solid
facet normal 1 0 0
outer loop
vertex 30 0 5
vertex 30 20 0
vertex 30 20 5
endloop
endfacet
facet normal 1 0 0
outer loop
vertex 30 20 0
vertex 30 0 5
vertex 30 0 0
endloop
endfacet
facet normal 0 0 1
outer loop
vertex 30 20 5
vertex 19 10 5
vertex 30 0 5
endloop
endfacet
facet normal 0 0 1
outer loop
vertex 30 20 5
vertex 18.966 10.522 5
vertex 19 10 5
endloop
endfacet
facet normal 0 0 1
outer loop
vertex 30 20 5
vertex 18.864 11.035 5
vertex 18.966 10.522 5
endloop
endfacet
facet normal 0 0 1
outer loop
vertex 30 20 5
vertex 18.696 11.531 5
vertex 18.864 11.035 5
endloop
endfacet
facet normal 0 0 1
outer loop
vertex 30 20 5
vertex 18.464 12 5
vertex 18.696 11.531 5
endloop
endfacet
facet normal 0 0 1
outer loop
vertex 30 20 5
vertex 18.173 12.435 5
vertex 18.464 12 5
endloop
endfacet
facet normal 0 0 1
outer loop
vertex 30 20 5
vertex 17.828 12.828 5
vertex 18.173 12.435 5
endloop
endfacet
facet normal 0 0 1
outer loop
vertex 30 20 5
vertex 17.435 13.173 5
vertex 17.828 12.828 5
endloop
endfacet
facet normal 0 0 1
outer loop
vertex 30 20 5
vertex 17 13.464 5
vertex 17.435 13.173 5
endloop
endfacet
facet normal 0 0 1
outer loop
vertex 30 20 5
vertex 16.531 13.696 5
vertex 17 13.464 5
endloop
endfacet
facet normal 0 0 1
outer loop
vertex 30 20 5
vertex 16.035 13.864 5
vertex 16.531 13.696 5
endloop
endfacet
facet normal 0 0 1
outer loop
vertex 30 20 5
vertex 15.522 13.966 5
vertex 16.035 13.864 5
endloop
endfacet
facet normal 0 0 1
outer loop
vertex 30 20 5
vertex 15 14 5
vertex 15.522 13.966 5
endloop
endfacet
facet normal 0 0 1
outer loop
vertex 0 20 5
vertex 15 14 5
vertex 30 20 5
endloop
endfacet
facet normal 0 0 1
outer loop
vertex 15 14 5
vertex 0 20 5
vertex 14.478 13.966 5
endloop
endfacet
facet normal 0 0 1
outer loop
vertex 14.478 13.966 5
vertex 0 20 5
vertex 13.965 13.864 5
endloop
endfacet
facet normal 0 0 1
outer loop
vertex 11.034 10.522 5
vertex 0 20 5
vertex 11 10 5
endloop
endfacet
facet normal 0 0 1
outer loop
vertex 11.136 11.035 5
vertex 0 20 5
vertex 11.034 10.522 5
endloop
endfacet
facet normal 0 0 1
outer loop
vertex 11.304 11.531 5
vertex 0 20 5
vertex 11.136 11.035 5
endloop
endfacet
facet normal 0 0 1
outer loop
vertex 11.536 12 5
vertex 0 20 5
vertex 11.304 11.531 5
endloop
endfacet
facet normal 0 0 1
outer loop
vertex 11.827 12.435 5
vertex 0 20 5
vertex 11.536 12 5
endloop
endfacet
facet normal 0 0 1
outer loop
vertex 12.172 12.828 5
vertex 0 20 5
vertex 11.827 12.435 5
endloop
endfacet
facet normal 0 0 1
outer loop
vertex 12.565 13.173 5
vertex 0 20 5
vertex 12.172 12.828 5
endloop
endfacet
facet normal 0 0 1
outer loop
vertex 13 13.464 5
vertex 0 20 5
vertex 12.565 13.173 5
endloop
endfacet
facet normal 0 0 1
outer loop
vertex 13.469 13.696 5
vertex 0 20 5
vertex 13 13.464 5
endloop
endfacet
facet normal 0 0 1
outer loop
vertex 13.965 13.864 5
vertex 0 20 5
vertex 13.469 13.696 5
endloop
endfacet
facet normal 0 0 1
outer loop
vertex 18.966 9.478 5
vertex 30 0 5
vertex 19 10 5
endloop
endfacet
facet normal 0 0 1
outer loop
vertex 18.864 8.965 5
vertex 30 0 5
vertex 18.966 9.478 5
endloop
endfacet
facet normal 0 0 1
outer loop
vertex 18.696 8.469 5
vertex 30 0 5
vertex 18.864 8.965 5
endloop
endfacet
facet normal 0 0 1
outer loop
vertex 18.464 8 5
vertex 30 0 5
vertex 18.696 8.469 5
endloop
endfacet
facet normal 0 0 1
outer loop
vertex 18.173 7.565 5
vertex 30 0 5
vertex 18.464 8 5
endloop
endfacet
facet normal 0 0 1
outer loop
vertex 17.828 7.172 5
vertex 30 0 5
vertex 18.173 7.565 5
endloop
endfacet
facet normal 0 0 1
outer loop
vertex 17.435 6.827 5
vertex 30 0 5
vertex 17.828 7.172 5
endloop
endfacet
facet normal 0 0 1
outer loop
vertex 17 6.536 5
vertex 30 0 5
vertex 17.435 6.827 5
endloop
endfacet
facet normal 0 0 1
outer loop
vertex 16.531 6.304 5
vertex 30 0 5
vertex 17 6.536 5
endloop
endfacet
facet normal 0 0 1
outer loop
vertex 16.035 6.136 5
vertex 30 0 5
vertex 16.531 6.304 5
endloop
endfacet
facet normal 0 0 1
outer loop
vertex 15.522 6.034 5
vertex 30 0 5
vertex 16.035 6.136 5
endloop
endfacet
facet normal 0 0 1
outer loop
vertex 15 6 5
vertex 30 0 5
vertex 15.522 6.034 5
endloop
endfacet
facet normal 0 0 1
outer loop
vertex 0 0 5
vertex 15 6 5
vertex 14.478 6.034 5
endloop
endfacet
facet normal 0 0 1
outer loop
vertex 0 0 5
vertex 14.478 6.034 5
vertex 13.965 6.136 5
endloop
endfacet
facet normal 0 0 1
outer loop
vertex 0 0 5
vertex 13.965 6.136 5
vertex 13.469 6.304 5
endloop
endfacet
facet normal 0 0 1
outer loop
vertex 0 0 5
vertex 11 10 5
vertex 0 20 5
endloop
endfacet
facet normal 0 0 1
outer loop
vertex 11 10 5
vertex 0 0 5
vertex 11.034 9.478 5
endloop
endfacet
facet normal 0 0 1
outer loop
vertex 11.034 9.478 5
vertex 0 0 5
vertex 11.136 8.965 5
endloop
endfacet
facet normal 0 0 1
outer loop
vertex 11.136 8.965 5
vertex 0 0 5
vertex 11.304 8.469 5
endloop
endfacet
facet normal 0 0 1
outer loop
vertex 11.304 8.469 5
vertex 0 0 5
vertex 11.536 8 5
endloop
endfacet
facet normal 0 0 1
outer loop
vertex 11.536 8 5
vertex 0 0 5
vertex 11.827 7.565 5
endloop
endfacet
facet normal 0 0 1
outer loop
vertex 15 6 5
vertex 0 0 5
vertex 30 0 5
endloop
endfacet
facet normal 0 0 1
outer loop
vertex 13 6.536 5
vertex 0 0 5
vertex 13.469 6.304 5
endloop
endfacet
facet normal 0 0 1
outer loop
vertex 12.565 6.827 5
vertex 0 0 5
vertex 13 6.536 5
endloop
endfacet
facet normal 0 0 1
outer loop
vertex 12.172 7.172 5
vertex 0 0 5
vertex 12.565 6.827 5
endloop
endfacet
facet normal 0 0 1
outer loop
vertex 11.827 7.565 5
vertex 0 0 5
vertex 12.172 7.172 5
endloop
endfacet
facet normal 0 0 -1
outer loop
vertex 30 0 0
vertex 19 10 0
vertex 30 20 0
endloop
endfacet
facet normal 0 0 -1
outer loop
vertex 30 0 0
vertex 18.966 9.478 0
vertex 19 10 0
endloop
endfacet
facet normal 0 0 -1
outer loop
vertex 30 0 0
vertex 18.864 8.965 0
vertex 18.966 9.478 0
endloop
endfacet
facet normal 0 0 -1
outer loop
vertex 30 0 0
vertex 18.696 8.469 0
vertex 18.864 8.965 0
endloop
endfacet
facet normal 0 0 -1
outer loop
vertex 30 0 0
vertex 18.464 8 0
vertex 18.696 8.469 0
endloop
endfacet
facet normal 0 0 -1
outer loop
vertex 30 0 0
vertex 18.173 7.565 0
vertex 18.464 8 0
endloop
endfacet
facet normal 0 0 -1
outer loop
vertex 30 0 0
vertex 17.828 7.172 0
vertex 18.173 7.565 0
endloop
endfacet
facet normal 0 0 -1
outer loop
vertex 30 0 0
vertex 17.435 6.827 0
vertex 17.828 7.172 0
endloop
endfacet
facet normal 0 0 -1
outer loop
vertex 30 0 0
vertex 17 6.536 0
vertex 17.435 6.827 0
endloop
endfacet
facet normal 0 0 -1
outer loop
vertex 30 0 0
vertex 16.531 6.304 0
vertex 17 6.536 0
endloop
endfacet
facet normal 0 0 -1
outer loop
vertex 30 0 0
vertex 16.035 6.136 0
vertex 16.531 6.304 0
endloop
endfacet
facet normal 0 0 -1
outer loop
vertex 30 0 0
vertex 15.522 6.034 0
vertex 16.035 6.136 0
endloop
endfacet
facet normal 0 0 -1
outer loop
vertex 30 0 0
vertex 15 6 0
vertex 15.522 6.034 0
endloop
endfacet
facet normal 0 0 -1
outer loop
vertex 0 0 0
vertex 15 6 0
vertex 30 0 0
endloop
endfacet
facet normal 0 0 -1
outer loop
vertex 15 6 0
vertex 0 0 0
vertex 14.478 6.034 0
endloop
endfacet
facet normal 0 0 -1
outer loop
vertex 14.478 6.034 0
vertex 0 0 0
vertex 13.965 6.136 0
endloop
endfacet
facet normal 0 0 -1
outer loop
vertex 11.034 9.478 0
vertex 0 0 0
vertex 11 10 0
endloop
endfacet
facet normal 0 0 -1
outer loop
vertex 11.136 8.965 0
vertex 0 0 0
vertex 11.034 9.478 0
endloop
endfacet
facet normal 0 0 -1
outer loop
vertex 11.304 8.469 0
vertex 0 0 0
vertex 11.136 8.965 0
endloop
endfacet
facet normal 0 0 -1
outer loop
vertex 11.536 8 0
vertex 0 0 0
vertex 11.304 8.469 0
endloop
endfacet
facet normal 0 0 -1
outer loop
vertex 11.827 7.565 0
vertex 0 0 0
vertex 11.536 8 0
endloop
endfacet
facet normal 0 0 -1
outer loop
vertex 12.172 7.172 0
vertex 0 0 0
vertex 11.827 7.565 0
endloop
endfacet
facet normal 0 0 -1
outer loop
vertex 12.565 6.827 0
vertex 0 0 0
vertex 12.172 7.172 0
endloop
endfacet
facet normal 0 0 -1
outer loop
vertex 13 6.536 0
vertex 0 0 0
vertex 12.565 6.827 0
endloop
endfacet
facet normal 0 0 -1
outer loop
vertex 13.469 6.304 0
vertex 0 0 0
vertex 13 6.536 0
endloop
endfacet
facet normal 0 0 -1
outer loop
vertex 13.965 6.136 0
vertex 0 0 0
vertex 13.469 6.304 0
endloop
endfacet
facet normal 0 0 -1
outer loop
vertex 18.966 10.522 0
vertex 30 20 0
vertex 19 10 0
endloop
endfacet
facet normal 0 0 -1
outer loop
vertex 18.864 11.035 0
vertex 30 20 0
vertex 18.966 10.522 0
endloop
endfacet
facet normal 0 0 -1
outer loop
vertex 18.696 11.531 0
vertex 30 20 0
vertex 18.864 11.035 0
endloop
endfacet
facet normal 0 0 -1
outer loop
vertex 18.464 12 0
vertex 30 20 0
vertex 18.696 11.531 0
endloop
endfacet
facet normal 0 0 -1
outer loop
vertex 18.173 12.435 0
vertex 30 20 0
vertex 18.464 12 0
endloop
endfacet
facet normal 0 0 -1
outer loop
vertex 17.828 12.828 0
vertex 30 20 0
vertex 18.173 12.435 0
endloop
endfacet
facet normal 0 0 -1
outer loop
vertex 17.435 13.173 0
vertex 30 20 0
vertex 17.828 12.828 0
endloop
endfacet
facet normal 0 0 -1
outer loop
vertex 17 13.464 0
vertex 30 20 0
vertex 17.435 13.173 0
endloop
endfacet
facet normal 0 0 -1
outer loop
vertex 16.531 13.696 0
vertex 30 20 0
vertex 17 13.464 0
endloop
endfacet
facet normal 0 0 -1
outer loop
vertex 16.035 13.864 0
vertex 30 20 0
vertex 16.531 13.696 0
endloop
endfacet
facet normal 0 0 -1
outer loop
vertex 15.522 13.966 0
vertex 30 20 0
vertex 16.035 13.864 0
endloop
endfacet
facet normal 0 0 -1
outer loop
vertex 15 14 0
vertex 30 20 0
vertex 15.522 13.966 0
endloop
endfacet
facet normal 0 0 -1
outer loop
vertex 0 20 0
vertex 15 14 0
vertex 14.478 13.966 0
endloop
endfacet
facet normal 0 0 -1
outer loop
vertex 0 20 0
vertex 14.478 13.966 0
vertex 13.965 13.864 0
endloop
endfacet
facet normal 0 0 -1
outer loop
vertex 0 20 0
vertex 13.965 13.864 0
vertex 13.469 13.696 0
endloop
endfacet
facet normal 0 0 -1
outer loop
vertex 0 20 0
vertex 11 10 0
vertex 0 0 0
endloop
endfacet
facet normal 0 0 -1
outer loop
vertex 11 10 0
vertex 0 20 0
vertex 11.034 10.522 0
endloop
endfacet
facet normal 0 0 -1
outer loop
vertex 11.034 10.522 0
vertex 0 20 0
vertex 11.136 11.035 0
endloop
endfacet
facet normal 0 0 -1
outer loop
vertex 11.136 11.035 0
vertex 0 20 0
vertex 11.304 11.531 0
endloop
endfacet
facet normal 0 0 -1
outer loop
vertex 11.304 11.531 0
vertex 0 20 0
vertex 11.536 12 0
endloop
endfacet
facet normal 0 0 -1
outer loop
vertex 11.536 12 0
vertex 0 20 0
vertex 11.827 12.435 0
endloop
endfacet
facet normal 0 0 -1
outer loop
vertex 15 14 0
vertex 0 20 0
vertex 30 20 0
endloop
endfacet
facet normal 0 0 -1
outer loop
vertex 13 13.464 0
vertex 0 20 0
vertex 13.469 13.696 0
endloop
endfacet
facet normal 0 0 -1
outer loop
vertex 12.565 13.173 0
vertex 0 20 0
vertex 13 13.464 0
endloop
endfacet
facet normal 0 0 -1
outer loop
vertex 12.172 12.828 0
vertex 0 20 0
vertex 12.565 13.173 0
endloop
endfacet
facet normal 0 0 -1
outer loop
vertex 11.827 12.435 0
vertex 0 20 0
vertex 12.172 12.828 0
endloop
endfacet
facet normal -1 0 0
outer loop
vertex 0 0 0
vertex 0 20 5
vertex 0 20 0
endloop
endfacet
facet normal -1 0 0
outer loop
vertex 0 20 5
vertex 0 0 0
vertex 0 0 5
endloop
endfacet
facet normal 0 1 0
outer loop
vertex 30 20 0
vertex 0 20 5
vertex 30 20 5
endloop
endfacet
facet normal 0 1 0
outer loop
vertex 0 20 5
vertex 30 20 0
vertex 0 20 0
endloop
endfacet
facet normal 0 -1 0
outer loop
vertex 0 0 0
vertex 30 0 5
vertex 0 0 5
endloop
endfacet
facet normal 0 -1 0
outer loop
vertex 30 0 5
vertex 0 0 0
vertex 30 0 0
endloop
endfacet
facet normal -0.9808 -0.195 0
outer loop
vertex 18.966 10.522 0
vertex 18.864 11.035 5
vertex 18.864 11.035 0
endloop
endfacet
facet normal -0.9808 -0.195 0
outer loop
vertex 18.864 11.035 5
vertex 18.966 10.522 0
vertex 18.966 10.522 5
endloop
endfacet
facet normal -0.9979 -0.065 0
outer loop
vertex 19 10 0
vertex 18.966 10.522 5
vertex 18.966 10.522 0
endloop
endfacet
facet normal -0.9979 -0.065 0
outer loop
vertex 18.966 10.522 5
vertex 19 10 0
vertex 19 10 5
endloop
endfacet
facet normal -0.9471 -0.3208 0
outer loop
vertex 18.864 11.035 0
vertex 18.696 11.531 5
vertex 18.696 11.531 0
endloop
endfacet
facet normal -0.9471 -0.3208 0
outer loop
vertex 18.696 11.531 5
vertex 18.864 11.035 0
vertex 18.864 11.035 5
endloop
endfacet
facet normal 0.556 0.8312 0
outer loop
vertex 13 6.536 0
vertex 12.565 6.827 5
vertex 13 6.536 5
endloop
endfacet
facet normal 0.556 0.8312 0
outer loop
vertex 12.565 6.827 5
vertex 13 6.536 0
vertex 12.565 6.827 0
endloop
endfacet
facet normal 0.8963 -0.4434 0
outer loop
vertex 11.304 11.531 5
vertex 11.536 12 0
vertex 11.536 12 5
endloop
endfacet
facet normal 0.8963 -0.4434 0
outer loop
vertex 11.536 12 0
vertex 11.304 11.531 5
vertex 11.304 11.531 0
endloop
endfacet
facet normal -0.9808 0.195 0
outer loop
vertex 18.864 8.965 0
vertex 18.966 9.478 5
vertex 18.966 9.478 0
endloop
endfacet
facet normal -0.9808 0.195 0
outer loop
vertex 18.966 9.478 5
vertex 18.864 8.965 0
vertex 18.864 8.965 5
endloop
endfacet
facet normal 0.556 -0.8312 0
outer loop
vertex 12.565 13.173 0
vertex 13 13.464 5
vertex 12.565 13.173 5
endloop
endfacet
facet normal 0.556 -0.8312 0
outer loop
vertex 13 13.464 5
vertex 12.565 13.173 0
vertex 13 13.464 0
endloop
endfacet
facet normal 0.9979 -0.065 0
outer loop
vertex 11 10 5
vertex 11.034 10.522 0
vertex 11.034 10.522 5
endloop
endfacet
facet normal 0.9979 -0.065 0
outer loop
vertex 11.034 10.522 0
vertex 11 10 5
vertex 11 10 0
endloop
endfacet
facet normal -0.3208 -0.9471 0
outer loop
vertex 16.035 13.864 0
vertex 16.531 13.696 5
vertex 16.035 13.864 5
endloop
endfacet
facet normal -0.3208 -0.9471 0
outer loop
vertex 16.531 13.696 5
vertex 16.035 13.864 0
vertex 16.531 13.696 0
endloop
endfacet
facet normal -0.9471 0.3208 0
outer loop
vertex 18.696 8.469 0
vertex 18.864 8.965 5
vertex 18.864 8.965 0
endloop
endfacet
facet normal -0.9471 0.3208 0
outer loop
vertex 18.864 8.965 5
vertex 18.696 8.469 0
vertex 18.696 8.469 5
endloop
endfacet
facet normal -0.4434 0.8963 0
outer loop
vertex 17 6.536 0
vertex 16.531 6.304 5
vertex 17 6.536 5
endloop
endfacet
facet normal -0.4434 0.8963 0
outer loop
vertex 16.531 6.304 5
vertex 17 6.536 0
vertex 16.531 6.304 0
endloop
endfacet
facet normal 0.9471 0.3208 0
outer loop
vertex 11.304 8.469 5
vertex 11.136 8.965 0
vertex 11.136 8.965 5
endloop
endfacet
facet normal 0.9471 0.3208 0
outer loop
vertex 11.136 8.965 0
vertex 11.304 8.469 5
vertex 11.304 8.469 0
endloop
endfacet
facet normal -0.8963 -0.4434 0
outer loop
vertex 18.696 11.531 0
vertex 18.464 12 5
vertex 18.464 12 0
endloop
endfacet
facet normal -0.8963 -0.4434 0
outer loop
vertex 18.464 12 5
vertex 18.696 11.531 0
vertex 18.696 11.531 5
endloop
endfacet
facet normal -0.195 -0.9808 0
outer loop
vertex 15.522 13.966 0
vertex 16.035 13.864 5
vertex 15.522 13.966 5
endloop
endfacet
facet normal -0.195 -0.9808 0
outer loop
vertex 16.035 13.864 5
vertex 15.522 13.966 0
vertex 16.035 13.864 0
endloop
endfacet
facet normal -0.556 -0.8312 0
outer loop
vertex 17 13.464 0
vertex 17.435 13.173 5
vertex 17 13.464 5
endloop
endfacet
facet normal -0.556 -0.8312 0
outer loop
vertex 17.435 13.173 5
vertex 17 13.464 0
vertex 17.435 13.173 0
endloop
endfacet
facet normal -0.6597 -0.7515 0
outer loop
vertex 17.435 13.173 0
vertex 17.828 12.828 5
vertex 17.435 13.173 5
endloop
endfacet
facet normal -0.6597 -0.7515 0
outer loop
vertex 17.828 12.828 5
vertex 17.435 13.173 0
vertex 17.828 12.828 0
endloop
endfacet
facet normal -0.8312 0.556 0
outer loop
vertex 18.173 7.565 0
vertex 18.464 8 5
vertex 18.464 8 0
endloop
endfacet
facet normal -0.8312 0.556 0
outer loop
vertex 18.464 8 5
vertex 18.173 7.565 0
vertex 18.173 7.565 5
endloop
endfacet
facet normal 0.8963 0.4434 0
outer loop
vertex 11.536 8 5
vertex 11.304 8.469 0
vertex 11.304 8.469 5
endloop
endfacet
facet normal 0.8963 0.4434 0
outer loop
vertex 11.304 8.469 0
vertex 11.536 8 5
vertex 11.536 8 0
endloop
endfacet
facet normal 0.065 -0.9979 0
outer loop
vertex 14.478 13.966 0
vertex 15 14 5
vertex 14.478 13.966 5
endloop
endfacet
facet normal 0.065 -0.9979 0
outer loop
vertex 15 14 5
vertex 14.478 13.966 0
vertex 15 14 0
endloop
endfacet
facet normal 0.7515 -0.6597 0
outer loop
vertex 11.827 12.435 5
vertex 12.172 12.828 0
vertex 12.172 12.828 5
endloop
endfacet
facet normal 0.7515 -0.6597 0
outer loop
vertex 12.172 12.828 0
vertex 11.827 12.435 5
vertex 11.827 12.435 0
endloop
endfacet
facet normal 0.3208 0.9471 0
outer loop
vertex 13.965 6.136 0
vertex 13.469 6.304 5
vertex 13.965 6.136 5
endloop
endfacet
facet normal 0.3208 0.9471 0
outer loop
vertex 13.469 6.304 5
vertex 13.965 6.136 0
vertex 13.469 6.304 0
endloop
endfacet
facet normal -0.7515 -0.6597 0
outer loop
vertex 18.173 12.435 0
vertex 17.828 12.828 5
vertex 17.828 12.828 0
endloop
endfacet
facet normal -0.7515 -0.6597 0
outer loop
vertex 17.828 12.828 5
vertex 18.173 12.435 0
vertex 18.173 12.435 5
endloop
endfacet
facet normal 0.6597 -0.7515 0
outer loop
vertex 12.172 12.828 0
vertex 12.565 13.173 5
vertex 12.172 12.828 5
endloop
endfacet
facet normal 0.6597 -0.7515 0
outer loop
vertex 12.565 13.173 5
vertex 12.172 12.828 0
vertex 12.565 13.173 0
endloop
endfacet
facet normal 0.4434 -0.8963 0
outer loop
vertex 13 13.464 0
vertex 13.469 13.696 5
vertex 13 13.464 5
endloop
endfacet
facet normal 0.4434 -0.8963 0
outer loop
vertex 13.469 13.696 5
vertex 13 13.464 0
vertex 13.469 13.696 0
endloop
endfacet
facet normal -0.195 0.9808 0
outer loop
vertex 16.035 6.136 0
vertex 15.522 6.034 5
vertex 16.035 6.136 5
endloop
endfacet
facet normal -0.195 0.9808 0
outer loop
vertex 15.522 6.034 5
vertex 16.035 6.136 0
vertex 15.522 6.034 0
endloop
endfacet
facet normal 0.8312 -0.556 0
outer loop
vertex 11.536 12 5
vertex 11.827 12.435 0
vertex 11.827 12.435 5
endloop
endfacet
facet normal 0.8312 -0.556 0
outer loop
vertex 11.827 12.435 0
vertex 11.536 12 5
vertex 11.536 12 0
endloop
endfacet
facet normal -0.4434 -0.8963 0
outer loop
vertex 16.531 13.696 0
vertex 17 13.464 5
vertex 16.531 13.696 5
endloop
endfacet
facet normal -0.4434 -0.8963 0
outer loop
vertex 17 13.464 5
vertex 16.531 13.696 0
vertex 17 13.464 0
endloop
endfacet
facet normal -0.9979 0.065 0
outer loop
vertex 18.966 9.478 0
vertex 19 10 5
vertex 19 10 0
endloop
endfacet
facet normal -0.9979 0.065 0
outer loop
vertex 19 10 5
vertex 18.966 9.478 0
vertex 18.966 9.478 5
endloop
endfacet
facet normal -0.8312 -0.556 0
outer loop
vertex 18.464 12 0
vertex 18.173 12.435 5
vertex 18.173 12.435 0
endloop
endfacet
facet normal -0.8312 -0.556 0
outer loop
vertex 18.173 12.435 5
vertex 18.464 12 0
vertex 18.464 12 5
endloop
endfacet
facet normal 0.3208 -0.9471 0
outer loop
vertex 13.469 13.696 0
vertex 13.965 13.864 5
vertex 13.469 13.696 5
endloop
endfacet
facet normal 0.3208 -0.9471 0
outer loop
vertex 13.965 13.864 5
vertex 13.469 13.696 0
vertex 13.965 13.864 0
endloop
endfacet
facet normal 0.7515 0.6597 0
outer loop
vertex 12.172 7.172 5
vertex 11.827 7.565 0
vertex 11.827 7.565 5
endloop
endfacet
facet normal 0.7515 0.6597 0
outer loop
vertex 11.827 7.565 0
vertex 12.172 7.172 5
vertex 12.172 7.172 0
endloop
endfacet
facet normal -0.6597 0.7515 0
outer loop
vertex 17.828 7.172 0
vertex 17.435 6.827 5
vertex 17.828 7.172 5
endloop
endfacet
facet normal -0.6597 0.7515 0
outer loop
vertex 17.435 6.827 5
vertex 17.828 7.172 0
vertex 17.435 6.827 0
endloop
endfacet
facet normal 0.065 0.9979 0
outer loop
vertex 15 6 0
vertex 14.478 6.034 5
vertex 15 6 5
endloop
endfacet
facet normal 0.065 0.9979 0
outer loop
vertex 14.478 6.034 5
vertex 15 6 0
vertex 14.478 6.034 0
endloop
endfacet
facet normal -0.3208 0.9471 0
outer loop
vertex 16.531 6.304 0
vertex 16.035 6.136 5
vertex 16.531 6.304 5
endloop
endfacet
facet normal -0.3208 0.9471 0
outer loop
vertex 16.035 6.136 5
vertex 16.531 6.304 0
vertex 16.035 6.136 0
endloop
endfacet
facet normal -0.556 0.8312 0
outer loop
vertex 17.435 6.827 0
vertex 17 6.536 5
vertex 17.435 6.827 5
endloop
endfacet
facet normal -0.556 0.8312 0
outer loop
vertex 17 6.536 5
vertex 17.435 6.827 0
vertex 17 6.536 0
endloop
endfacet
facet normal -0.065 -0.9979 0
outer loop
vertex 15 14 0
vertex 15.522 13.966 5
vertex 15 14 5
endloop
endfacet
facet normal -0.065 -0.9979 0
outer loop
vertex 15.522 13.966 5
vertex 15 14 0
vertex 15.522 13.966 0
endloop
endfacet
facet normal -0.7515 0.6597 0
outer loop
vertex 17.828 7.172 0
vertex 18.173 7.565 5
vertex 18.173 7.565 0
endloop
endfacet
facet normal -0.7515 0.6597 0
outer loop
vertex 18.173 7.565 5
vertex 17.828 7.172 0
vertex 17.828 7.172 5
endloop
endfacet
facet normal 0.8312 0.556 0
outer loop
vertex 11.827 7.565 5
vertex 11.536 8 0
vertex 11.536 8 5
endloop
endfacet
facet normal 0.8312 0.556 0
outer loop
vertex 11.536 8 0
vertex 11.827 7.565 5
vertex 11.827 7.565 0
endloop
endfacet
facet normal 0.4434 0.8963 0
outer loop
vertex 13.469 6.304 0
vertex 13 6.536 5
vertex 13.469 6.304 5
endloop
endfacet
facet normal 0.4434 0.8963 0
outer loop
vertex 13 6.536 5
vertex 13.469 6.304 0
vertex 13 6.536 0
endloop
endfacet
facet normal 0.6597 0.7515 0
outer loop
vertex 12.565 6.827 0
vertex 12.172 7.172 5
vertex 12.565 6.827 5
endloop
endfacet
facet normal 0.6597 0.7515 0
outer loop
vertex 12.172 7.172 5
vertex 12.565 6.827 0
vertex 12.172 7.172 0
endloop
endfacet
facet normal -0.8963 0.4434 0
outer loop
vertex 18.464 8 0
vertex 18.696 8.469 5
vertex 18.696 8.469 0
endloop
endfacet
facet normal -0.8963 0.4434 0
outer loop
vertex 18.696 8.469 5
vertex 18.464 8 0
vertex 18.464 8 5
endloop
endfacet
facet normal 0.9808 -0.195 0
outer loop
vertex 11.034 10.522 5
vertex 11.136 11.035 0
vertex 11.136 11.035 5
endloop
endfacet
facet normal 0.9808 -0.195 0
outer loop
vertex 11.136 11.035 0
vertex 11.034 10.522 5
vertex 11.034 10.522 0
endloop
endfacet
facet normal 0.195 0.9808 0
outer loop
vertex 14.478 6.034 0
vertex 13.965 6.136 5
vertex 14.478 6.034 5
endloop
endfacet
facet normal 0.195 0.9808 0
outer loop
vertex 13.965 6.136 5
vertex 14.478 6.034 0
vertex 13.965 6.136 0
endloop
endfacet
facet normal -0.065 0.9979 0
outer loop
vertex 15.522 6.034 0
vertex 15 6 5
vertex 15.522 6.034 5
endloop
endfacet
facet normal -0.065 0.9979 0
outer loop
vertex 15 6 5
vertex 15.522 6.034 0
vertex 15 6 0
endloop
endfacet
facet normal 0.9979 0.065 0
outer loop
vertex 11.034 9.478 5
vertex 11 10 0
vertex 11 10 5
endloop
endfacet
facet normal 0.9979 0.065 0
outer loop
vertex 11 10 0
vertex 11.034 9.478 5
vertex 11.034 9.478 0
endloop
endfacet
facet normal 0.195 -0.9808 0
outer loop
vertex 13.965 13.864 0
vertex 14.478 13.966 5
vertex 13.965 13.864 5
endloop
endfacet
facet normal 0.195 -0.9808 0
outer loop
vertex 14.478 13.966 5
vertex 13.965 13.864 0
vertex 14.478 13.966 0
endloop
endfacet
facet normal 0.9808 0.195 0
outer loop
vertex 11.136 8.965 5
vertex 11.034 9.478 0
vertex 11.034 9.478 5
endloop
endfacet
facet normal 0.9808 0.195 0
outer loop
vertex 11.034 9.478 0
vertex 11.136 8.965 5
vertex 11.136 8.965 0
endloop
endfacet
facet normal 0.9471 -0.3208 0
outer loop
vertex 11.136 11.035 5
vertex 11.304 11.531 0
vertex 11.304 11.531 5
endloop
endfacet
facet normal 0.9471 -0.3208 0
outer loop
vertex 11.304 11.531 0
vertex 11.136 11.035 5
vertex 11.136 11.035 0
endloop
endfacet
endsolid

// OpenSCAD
// A plate with a round hole
difference() {
    cube([30, 20, 5]);
    translate([15, 10, -1]) cylinder(h = 7, r = 4, $fn = 48);
}
